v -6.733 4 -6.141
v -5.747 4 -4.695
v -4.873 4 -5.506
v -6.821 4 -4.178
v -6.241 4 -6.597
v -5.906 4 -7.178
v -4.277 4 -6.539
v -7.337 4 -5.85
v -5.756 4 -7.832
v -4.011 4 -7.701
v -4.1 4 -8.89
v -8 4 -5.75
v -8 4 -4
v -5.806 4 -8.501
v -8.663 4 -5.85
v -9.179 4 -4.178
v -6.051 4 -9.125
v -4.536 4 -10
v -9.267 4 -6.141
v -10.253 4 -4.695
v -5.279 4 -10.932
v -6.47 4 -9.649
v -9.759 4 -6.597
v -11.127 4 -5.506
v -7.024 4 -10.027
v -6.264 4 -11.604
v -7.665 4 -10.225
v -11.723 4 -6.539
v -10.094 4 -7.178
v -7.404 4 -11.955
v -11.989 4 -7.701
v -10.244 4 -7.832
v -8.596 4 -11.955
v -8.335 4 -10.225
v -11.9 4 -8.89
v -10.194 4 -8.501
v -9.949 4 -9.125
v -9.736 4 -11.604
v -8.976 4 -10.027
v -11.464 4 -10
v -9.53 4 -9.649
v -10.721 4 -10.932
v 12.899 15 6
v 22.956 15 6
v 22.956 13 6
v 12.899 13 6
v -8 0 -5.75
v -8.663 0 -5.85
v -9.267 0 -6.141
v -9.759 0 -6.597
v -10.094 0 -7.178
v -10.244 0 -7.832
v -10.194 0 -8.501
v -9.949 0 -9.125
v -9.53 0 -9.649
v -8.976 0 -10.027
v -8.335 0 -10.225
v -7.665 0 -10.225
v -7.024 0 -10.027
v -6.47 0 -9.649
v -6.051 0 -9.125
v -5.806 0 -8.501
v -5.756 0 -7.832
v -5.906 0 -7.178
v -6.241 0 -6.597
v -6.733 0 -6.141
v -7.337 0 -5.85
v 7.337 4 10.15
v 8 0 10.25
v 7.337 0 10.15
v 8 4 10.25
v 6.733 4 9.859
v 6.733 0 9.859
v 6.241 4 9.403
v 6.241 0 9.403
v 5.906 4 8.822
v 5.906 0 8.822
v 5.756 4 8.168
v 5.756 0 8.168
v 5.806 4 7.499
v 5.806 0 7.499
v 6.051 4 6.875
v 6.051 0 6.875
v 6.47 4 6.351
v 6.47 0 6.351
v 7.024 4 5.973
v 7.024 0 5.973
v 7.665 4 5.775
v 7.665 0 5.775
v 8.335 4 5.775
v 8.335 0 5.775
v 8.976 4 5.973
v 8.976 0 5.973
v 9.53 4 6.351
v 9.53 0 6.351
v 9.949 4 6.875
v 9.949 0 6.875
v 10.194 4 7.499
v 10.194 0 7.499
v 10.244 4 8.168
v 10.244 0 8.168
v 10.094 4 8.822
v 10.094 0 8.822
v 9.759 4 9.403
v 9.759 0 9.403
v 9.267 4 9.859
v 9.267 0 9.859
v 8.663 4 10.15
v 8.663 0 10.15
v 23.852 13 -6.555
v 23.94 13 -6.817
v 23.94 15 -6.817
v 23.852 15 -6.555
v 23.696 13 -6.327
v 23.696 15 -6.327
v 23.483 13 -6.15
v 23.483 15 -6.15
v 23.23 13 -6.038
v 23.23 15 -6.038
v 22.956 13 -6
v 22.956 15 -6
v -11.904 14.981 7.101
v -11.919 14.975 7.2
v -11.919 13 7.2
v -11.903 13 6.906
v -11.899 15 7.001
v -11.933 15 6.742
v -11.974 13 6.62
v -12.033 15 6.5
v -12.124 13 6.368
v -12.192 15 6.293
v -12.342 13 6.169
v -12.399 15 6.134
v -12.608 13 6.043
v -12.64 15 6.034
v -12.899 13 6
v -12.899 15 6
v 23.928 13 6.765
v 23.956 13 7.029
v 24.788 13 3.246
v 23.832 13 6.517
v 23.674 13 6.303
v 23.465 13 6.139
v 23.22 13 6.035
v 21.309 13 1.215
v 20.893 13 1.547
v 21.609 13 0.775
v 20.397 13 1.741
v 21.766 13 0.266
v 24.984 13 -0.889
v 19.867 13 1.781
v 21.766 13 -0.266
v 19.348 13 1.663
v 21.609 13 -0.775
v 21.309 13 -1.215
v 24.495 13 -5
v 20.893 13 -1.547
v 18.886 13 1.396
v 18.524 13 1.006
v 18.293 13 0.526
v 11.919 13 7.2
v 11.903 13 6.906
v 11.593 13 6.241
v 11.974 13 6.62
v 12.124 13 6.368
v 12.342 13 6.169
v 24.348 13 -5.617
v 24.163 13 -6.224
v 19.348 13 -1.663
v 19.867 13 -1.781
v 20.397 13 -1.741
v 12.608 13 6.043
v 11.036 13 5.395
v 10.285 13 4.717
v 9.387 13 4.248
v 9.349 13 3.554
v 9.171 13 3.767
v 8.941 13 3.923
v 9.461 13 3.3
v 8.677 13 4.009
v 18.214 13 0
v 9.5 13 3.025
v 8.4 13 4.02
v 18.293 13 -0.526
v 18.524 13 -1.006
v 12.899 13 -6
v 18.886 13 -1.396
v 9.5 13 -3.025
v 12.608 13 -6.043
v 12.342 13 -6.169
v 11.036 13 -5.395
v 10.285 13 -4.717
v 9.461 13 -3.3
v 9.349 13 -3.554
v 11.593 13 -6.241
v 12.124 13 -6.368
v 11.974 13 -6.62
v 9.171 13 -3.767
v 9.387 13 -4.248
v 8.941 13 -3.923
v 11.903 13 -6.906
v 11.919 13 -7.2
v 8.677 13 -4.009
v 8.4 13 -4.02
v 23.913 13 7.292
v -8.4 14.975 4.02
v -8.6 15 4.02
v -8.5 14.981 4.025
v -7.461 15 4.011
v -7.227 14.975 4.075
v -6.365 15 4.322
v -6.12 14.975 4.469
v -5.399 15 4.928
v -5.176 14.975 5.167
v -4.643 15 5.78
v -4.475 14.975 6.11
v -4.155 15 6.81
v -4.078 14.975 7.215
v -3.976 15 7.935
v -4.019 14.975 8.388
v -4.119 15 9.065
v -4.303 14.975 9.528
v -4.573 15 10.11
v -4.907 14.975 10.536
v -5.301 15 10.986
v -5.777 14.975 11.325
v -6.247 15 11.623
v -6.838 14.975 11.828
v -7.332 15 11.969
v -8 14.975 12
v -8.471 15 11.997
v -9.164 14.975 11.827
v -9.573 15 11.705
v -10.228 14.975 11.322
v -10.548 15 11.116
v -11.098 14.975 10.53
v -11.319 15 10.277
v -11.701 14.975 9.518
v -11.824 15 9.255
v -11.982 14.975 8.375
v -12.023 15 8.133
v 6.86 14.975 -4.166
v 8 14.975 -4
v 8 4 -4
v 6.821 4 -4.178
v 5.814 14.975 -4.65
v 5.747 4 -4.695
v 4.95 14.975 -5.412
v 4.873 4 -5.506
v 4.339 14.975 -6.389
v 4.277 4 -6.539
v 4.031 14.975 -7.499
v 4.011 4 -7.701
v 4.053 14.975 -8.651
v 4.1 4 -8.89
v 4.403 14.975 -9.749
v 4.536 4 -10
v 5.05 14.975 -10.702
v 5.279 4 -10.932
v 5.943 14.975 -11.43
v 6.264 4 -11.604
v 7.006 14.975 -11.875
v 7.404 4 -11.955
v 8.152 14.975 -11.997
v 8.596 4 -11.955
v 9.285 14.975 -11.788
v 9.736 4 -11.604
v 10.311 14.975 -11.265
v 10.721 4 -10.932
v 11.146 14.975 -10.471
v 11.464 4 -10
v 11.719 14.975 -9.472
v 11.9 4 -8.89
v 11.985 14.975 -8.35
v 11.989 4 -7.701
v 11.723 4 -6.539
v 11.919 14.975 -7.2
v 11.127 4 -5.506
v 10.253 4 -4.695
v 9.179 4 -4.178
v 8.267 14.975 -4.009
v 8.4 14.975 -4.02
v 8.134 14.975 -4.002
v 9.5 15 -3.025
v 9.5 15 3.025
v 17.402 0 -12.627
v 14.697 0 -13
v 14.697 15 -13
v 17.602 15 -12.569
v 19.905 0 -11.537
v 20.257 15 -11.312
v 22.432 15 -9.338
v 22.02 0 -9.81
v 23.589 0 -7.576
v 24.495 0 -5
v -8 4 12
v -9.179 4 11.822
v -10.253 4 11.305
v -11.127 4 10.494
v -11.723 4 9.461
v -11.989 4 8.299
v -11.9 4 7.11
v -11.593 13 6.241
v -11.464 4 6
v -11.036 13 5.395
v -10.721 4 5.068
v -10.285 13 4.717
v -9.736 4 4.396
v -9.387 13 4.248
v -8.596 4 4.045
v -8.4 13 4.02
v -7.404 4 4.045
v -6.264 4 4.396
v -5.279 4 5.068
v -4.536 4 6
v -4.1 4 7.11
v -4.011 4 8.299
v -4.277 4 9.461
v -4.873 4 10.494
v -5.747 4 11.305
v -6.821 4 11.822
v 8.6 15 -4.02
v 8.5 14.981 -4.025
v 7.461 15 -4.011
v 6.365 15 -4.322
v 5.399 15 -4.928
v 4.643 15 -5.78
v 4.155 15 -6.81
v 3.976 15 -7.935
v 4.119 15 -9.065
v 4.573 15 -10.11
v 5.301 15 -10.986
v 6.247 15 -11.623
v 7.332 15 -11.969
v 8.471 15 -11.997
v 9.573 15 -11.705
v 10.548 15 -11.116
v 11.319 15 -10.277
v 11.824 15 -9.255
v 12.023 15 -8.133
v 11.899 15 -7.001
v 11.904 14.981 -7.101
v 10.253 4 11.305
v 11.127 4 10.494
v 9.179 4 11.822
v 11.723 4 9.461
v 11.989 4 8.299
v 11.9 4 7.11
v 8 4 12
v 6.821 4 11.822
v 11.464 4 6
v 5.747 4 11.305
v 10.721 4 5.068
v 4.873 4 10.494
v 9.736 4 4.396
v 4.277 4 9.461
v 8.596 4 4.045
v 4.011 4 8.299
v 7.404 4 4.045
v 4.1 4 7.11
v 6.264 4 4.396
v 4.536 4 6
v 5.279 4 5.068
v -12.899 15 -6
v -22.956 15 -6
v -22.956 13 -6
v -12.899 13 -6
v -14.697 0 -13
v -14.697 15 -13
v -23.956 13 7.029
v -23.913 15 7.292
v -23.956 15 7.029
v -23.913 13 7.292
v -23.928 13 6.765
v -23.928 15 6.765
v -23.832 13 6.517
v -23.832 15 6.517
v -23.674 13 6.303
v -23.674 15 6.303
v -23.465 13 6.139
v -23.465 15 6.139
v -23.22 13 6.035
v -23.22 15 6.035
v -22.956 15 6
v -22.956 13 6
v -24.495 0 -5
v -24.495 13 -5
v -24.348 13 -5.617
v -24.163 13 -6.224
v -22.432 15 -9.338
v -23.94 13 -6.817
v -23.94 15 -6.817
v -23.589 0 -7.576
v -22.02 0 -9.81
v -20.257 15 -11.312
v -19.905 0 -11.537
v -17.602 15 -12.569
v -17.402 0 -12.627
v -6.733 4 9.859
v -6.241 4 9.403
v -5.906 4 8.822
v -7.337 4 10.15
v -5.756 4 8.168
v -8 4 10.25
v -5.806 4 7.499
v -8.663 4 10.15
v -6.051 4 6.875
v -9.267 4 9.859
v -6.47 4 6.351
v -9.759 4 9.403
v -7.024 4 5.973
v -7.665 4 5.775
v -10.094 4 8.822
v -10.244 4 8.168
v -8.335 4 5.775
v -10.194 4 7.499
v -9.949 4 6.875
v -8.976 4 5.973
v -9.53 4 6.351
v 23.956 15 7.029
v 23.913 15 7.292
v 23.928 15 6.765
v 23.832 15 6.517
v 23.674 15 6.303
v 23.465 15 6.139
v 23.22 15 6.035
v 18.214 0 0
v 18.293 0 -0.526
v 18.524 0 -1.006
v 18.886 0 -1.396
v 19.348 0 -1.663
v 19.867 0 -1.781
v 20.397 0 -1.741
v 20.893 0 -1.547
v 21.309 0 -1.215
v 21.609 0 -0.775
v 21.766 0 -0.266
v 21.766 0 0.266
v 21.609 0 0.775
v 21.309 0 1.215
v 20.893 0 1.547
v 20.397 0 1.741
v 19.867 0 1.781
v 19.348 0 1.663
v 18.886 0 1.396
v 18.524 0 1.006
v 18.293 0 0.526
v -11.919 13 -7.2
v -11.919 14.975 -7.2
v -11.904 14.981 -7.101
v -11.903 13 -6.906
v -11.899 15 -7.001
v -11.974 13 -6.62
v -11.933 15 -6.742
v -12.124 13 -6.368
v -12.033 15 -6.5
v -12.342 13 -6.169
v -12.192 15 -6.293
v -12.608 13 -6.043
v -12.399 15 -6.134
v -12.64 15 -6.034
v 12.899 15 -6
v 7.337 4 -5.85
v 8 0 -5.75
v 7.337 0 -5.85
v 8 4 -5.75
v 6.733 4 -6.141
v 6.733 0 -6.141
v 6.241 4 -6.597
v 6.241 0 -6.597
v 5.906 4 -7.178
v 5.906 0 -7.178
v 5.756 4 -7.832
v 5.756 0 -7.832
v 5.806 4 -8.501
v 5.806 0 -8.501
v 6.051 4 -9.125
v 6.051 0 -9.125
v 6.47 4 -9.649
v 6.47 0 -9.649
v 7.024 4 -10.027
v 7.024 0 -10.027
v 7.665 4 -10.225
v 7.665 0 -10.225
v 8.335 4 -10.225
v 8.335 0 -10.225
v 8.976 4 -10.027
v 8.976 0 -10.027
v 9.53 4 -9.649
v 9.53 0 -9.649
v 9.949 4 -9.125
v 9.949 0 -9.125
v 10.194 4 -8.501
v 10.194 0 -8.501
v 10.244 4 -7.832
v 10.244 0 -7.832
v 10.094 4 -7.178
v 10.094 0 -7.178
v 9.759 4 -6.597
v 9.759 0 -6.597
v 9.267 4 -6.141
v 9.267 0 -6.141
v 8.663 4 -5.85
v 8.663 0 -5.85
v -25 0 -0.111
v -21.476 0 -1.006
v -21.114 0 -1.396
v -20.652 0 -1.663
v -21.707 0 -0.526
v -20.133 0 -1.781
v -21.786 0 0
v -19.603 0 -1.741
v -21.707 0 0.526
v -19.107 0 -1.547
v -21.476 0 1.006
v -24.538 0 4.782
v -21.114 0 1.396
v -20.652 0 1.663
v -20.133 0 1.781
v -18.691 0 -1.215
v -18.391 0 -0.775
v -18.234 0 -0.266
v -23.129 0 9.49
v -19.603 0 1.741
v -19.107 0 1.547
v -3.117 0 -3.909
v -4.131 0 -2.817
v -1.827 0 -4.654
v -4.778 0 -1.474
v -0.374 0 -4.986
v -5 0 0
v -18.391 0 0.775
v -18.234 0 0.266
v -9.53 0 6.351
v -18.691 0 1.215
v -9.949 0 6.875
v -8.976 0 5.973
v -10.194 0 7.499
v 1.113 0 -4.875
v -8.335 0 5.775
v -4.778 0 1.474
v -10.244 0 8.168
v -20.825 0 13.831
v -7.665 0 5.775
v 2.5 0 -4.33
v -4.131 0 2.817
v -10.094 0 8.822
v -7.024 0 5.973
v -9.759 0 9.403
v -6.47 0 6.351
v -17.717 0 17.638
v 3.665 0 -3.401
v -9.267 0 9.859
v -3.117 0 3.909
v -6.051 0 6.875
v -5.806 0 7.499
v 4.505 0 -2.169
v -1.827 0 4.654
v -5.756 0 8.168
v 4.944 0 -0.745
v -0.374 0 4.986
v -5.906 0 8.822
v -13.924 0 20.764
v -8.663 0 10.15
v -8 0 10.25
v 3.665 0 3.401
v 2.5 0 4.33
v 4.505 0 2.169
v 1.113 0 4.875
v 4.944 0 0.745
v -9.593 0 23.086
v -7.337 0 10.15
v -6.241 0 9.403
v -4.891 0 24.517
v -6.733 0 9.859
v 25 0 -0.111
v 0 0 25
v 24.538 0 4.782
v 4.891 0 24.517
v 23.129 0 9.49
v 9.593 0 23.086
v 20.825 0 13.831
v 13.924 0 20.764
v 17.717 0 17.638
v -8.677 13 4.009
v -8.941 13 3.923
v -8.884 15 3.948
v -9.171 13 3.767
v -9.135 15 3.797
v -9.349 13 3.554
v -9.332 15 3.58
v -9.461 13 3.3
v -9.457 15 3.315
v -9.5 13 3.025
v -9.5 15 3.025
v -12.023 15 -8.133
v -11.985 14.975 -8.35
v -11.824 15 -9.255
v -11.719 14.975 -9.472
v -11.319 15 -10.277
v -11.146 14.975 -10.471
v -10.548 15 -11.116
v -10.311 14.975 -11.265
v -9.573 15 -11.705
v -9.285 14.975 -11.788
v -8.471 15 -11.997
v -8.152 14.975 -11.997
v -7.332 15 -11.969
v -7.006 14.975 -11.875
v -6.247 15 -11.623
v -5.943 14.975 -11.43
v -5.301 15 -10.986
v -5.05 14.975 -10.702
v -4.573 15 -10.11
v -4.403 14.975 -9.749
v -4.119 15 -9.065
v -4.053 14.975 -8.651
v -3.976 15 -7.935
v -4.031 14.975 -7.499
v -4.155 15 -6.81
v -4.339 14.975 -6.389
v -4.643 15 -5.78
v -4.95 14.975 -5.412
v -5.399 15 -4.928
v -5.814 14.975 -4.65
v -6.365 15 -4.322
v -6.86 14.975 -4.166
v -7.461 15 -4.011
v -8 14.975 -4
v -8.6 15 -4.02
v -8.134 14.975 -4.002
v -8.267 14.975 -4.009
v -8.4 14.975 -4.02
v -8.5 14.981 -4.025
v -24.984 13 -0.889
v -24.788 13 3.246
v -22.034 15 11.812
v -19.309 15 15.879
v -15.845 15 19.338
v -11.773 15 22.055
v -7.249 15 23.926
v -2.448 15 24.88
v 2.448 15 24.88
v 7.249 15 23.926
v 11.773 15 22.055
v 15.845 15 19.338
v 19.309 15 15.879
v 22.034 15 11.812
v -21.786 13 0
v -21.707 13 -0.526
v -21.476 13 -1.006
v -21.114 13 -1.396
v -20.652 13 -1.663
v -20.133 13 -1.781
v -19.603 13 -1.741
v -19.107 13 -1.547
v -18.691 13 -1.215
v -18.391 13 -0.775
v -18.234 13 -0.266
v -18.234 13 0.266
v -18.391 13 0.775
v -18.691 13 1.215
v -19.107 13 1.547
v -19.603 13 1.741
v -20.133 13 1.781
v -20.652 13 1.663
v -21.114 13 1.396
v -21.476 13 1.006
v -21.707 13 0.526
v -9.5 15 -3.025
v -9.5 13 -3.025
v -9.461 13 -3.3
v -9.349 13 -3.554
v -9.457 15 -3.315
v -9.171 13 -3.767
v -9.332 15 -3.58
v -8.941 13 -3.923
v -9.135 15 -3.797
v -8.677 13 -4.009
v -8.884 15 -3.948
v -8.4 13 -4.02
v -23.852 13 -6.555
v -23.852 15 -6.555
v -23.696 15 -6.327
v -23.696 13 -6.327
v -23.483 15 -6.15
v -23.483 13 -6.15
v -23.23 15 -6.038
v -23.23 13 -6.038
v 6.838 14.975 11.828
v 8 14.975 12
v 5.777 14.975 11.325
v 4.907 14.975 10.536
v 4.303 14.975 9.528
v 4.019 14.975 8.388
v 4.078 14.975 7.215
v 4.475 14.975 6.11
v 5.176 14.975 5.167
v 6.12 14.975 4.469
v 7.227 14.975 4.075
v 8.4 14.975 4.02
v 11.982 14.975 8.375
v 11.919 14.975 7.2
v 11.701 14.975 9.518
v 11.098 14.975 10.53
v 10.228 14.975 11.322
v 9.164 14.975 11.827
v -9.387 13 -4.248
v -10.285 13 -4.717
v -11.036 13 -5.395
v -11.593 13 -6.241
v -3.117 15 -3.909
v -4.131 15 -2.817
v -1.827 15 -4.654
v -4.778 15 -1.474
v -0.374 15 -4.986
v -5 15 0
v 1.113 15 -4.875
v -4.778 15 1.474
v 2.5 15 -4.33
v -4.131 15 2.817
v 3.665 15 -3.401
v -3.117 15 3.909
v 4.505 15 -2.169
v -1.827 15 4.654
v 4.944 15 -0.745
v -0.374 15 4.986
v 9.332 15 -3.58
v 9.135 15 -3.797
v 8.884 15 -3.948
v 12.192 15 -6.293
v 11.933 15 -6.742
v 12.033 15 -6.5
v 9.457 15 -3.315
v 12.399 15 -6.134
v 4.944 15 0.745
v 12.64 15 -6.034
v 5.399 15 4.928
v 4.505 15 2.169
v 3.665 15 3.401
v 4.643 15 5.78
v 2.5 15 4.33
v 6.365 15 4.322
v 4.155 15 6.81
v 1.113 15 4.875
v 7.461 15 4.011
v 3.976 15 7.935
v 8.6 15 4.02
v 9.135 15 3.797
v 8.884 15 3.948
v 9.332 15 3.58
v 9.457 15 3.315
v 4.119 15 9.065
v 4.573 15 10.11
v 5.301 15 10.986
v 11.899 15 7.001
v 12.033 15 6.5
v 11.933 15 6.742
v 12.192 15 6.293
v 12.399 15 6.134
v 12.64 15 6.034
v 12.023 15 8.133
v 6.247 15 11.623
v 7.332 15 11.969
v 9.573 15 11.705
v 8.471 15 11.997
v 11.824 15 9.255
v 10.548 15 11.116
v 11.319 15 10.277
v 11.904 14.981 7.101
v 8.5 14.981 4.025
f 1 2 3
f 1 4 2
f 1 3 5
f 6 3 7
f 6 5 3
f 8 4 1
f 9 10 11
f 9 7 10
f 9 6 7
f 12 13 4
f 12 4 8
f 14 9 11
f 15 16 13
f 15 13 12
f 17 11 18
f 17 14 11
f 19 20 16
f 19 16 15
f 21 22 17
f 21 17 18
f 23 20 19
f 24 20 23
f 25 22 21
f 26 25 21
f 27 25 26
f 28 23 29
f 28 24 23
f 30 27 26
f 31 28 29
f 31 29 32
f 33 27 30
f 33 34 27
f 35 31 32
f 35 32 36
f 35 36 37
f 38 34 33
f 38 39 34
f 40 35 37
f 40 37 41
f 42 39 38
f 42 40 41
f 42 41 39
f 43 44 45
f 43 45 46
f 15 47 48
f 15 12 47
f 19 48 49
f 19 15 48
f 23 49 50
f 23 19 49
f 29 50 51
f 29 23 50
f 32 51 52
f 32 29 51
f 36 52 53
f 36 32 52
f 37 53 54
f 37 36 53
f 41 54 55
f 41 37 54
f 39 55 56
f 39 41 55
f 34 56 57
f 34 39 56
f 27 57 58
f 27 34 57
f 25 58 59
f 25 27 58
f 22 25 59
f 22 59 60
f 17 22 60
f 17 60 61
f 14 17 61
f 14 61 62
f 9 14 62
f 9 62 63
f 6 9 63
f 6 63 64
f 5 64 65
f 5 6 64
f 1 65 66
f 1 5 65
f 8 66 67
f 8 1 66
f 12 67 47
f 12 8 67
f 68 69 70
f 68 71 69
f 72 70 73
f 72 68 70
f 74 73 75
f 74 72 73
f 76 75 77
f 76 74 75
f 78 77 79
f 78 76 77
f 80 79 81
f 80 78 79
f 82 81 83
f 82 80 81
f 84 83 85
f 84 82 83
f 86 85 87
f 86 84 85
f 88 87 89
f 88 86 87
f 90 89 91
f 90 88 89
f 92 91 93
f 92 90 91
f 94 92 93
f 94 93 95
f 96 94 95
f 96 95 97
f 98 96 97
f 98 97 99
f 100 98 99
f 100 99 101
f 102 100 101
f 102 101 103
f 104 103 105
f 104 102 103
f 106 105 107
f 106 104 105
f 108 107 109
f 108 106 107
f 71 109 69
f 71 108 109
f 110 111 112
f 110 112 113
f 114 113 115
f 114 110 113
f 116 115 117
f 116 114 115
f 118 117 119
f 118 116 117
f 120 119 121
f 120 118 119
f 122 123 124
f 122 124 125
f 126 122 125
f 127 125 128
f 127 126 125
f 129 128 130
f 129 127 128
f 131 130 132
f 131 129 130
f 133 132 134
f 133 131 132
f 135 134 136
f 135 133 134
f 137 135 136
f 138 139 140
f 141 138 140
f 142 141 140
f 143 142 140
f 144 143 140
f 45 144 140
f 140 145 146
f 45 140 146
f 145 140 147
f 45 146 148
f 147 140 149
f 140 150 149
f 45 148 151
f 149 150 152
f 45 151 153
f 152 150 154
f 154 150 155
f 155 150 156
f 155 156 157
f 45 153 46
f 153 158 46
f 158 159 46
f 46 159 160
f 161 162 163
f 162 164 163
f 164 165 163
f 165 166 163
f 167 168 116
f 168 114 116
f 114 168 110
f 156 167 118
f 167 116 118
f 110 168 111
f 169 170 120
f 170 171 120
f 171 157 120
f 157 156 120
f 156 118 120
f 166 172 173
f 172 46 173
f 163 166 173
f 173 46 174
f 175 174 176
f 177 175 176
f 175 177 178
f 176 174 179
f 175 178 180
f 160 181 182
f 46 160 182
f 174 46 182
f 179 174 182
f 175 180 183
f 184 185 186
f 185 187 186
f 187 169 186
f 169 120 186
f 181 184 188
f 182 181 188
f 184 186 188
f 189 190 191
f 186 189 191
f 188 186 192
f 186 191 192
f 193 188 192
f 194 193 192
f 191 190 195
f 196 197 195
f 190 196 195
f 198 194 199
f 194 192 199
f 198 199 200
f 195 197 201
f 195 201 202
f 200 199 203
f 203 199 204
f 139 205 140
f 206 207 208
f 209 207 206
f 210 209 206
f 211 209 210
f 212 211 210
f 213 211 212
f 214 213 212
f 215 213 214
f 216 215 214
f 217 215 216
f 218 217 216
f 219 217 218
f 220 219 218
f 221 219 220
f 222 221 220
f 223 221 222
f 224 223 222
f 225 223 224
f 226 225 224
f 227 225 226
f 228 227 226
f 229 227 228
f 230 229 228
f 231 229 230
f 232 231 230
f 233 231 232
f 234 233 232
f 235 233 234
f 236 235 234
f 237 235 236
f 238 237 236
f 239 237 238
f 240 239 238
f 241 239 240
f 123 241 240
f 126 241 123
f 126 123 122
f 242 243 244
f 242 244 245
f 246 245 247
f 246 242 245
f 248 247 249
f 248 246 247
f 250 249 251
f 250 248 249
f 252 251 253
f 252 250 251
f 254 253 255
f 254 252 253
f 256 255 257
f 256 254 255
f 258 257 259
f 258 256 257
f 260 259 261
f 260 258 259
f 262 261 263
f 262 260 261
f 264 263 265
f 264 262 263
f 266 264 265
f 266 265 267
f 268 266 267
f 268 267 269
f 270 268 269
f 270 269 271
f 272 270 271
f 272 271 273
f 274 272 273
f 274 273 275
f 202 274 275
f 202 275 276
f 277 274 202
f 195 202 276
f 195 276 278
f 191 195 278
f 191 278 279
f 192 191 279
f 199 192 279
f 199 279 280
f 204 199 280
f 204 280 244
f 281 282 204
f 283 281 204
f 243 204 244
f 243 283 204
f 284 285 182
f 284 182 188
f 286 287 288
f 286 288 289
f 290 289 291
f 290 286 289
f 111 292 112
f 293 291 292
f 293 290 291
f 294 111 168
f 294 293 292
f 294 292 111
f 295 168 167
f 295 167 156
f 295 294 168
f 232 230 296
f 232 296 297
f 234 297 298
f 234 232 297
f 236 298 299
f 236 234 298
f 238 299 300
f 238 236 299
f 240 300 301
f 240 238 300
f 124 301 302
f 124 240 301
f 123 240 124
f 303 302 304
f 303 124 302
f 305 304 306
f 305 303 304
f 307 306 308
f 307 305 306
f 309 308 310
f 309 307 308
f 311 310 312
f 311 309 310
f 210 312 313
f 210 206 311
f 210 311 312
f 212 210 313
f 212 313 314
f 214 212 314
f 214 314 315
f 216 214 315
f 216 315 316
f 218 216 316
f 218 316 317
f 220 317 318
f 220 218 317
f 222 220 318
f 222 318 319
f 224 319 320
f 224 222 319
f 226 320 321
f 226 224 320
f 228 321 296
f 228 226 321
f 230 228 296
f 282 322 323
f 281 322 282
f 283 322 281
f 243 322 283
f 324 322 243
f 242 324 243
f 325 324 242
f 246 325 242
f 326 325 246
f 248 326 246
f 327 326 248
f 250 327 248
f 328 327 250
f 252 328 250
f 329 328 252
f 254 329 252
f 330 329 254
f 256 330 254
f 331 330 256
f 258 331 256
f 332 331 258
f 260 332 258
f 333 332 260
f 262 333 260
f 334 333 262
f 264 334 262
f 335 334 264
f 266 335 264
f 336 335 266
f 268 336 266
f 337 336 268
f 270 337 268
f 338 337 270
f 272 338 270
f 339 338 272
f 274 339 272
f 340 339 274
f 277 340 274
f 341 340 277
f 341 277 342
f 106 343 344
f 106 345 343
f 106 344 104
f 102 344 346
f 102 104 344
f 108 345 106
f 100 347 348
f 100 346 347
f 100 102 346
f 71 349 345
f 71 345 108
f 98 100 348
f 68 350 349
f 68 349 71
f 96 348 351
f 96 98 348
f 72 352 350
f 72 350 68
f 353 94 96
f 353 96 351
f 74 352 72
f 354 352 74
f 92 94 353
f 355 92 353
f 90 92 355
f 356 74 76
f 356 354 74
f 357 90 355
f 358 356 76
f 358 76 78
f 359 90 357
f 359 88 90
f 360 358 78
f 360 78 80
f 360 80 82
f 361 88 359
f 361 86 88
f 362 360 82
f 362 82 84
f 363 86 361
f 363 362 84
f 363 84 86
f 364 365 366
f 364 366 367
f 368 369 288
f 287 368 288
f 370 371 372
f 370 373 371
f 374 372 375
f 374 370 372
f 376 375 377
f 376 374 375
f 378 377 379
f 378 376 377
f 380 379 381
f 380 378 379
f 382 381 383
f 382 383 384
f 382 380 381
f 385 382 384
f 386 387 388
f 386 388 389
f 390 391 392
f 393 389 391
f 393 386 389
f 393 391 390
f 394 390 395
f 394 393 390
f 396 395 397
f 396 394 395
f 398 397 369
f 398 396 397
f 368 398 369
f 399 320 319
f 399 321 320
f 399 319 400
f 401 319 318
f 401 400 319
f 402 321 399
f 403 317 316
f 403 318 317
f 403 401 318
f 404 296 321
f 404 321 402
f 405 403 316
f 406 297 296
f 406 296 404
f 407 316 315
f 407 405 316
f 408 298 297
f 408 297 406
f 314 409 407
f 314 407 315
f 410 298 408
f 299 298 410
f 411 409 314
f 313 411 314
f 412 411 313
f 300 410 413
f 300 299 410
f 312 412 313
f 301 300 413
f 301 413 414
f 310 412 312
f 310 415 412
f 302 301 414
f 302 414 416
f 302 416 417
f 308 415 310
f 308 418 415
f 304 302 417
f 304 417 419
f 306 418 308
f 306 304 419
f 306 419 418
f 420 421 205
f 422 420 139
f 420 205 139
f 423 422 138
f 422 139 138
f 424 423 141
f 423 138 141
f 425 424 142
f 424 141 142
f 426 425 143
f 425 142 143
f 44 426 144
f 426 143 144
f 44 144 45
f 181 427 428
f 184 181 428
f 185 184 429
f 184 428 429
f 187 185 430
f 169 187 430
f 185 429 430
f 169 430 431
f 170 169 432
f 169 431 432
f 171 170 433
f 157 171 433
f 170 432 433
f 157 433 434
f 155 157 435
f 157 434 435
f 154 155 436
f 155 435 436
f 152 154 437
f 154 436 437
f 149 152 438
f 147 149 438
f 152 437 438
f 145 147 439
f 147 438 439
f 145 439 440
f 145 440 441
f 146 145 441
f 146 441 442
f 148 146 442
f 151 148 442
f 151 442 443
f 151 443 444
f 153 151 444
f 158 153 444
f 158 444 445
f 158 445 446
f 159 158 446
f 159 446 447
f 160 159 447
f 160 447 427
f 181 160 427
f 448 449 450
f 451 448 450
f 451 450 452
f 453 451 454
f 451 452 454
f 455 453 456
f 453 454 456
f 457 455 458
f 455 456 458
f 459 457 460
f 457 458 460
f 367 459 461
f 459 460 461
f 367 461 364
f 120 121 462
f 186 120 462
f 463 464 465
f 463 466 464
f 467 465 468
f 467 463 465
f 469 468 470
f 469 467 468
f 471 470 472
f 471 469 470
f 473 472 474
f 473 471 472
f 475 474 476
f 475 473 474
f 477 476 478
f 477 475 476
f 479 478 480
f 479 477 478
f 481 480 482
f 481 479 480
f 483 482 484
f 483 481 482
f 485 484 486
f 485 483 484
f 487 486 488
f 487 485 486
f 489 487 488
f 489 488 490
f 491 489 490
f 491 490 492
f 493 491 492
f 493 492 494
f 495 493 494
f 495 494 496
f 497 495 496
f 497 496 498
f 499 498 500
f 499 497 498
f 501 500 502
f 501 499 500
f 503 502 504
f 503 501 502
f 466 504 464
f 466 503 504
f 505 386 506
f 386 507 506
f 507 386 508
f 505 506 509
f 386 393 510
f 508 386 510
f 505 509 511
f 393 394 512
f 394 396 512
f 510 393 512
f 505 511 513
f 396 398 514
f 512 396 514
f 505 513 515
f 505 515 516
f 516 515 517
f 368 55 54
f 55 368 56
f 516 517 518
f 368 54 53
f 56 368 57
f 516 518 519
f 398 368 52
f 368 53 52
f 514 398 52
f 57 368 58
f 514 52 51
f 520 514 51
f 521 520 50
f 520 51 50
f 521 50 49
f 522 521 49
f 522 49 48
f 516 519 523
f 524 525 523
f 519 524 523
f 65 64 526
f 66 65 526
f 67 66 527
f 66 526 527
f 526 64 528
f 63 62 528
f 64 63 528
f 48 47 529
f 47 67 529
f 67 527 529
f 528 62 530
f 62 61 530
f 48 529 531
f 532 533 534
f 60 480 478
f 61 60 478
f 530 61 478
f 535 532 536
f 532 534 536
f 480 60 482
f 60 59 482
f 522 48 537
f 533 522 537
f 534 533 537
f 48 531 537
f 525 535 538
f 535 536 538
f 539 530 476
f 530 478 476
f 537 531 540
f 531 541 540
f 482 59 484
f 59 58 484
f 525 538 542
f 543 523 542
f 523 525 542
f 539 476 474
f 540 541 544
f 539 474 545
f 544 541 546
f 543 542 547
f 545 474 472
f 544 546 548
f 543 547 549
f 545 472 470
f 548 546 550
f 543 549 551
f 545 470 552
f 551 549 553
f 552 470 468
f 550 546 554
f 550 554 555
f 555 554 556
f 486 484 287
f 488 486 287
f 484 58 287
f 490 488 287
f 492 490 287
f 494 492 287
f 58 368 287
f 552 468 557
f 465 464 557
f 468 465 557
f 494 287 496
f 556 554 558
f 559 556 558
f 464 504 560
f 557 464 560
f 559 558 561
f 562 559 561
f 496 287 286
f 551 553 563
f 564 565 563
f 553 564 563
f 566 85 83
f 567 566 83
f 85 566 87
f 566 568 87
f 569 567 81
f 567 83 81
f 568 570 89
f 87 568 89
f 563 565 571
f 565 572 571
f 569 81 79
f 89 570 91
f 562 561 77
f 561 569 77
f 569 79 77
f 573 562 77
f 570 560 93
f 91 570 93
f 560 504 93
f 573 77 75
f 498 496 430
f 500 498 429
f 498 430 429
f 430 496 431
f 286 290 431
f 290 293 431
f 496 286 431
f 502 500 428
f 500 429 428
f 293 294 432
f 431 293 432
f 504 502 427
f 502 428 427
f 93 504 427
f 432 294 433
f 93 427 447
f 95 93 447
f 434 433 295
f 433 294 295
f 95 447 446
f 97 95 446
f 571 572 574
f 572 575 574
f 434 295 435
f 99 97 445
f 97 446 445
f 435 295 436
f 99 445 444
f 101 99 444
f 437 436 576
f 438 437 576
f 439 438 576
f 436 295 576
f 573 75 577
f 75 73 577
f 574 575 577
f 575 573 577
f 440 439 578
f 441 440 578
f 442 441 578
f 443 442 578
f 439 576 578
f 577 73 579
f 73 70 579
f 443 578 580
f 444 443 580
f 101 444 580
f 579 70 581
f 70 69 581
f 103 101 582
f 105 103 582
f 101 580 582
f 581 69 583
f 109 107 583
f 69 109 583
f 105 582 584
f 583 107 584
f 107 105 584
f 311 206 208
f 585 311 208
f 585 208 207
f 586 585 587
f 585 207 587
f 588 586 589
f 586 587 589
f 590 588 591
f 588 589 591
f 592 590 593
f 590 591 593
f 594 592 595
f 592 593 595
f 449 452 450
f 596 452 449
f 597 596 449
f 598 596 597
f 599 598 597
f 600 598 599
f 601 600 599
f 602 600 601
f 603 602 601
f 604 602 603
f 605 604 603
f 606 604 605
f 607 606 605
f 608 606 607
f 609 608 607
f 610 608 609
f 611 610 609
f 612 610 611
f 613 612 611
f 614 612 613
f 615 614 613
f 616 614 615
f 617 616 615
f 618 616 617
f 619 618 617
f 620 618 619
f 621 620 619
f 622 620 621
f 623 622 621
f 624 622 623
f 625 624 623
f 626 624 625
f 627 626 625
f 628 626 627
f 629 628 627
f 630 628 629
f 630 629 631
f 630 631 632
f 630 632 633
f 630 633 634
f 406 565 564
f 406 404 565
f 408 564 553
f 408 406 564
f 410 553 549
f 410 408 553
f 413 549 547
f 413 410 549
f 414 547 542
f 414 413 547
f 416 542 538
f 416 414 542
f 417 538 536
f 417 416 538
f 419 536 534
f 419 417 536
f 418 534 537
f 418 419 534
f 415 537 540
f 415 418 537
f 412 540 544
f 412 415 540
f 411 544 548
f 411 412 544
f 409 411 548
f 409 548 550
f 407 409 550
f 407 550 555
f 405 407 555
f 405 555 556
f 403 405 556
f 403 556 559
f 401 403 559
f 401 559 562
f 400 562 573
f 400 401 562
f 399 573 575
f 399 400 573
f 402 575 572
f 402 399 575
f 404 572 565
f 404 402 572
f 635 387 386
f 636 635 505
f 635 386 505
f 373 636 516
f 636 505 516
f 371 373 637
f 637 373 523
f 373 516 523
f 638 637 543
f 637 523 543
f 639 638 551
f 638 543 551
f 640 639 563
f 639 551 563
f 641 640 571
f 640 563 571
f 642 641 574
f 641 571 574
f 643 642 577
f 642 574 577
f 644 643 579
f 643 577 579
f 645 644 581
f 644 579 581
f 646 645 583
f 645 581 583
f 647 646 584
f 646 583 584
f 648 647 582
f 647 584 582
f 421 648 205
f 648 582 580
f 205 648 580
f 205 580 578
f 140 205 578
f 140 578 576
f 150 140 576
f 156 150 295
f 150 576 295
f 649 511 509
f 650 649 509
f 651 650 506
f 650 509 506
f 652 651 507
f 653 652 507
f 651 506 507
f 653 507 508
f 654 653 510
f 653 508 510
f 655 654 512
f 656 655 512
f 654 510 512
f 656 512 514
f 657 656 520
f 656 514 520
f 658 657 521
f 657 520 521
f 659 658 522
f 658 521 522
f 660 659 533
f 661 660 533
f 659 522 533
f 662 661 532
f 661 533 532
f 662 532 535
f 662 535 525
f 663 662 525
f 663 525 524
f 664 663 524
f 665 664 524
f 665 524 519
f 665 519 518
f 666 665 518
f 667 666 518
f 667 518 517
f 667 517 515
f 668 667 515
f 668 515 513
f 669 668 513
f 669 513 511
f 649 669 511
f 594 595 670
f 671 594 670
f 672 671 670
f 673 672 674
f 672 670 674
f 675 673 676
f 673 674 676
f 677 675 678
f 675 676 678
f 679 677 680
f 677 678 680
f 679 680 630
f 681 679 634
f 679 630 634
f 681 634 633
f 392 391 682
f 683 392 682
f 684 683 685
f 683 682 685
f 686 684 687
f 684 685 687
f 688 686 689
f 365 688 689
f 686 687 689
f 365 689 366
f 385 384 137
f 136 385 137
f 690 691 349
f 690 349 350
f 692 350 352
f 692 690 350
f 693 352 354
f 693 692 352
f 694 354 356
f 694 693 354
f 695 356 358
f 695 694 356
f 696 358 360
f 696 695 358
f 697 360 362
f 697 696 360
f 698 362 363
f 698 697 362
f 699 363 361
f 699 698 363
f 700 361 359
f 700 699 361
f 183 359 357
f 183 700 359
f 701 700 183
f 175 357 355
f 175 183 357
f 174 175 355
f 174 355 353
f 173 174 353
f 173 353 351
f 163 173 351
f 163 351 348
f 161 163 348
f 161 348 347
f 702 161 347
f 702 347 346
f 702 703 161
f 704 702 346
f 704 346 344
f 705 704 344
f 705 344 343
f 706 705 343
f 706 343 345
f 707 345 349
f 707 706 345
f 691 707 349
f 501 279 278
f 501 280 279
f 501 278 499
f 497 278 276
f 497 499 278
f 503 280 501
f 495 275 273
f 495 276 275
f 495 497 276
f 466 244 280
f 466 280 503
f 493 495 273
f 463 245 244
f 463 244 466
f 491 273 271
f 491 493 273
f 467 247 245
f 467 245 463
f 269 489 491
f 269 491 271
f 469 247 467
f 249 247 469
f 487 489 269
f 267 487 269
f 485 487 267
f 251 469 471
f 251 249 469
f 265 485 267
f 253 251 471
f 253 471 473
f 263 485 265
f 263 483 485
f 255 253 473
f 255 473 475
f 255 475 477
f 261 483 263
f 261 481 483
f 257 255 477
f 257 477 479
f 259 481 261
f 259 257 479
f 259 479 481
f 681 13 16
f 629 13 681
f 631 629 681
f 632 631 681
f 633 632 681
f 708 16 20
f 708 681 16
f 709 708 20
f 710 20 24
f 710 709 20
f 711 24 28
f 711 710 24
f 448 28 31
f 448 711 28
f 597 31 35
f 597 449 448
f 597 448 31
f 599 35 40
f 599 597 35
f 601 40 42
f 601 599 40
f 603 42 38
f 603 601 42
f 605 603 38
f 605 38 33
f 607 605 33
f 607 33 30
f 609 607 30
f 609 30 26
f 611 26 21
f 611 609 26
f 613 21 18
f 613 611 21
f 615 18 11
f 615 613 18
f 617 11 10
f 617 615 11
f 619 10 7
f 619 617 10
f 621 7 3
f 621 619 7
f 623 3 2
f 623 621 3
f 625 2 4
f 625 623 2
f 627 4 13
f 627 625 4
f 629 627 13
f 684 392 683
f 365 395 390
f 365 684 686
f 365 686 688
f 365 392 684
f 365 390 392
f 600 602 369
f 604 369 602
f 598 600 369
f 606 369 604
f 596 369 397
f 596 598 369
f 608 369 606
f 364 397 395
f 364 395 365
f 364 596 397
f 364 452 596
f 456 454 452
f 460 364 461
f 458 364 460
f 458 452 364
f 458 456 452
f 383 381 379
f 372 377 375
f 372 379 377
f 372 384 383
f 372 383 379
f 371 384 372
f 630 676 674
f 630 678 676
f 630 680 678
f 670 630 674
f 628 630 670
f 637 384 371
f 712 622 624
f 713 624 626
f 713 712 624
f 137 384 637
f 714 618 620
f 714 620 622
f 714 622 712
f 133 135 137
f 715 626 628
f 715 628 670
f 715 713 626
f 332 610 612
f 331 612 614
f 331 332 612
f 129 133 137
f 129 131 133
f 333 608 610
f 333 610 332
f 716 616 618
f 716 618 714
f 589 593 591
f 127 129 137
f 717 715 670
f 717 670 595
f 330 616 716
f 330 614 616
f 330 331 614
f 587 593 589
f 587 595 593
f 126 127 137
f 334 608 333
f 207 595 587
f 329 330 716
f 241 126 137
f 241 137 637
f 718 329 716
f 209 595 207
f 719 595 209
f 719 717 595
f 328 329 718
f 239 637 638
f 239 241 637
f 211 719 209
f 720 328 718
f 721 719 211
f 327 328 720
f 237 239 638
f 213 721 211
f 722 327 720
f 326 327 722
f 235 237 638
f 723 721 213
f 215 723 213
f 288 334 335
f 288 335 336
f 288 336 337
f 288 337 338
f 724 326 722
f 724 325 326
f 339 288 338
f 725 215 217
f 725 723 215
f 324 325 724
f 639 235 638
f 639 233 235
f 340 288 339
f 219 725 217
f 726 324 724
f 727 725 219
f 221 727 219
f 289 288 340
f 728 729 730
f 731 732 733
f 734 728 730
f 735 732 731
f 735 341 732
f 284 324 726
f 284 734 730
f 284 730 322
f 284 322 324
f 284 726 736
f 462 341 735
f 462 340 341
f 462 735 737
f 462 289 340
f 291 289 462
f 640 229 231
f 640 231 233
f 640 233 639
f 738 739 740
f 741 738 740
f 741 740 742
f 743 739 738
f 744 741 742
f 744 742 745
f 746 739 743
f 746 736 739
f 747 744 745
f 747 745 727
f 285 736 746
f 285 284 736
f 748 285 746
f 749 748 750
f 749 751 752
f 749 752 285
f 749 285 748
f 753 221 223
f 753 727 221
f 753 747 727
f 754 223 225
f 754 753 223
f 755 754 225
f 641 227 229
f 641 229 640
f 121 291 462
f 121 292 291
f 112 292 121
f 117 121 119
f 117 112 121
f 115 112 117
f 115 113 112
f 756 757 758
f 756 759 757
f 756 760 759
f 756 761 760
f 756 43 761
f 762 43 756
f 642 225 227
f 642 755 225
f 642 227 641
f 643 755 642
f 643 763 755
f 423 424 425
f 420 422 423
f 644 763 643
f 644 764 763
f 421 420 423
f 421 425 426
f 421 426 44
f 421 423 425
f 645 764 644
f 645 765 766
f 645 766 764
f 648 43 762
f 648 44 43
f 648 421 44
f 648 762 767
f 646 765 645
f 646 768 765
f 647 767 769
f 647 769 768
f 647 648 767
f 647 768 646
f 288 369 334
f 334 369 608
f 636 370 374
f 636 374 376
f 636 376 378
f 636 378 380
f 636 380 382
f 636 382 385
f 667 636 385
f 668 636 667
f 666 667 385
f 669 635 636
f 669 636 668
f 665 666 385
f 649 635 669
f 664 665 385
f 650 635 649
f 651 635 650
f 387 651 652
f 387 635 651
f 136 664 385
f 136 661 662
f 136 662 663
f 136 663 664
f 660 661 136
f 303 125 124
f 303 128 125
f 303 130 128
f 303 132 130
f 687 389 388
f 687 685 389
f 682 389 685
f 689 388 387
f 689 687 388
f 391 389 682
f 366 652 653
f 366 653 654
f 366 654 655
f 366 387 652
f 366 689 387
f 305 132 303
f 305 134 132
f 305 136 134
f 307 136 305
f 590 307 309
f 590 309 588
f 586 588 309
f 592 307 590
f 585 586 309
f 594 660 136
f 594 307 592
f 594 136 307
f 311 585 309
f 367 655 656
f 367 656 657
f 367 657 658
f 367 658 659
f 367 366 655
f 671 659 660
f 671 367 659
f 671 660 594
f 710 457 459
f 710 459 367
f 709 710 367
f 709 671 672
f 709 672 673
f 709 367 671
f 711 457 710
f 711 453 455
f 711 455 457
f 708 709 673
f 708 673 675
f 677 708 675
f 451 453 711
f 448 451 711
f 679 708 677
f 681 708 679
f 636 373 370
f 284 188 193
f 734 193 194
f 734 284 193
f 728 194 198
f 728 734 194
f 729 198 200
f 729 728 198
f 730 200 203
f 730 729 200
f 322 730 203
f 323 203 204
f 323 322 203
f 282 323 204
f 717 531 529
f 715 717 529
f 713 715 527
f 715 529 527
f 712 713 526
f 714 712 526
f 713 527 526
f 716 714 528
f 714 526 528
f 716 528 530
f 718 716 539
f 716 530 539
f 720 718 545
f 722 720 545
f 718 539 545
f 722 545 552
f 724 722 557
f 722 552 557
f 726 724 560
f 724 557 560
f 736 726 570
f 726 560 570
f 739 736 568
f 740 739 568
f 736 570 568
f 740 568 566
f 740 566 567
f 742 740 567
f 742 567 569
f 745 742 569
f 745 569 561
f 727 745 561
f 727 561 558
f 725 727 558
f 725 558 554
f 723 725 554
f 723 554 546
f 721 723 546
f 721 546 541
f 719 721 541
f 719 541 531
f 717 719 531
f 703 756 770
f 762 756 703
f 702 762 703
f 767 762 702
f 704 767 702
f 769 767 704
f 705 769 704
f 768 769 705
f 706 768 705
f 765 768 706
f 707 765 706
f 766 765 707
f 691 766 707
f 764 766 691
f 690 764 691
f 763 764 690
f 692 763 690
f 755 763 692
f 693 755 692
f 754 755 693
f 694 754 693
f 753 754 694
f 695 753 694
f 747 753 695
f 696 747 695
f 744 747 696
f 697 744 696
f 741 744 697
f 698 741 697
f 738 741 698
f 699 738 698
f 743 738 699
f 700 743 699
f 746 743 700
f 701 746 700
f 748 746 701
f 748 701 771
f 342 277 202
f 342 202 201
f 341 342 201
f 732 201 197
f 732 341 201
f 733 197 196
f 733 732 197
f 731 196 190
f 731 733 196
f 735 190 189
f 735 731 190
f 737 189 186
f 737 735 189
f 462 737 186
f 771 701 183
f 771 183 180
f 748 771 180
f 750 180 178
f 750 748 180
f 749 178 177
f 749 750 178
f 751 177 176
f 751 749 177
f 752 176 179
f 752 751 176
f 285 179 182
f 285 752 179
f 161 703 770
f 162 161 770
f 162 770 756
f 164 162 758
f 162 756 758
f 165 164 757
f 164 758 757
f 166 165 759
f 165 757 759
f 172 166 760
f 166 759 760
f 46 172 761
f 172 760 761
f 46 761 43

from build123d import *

# Parameters (mm, degrees)
SKETCH1_R                       = 25
BOSS_EXTRUDE1_DEPTH             = 15
CBORE_FOR_M4_SHCS1_AT_2_COUNT   = 2
CBORE_FOR_M4_SHCS1_AT_2_PITCH   = 16
CBORE_FOR_M4_SHCS1_AT_3_COUNT   = 2
CBORE_FOR_M4_SHCS1_AT_3_PITCH   = 22.627416998
CBORE_FOR_M4_SHCS1_AT_4_COUNT   = 2
CBORE_FOR_M4_SHCS1_AT_4_PITCH   = 16
F_10_0MM_DOWEL_HOLE1_D          = 10
F_9_64_0_14063_DIAMETER_HOLE1_D = 3.572002
SKETCH9_W                       = 18
SKETCH9_H                       = 12
CUT_EXTRUDE1_DEPTH              = 2
FILLET2_R                       = 1
CUT_EXTRUDE2_DEPTH              = 39.405728739
FILLET3_START                   = -1
FILLET3_DEPTH                   = 17


with BuildPart() as part:
    # Sketch1 → Boss-Extrude1 (new body)
    with BuildSketch(Plane(origin=(0, 0, 0), x_dir=(1, 0, 0), z_dir=(0, 1, 0))):
        with Locations(Location((0, 0, 0), (0, 0, 270))):
            Circle(SKETCH1_R)
    extrude(amount=BOSS_EXTRUDE1_DEPTH)

    # Sketch4 → CBORE for M4 SHCS1 (revolve, cut)
    with BuildSketch(Plane(origin=(-8, 15, -8), x_dir=(0, 0, 1), z_dir=(1, 0, 0))):
        Polygon((0, 0), (0, 15), (2.25, 15), (2.25, 11), (4, 11), (4, 0.025), (4.025, 0), align=None)
    cbore_for_m4_shcs1 = revolve(axis=Axis((-8, 21.35, -8), (0, -1, 0)), mode=Mode.SUBTRACT)

    # CBORE for M4 SHCS1 at 2: CBORE for M4 SHCS1 ×2
    with Locations(*[(i * CBORE_FOR_M4_SHCS1_AT_2_PITCH, 0, 0) for i in range(1, CBORE_FOR_M4_SHCS1_AT_2_COUNT)]):
        add(cbore_for_m4_shcs1, mode=Mode.SUBTRACT)

    # CBORE for M4 SHCS1 at 3: CBORE for M4 SHCS1 ×2
    with Locations(*[Vector(0.7071067811865476, 0, 0.7071067811865476) * (i * CBORE_FOR_M4_SHCS1_AT_3_PITCH) for i in range(1, CBORE_FOR_M4_SHCS1_AT_3_COUNT)]):
        add(cbore_for_m4_shcs1, mode=Mode.SUBTRACT)

    # CBORE for M4 SHCS1 at 4: CBORE for M4 SHCS1 ×2
    with Locations(*[(0, 0, i * CBORE_FOR_M4_SHCS1_AT_4_PITCH) for i in range(1, CBORE_FOR_M4_SHCS1_AT_4_COUNT)]):
        add(cbore_for_m4_shcs1, mode=Mode.SUBTRACT)

    # Ø10.0mm Dowel Hole1 (through all)
    with Locations(Plane(origin=(0, 15, 0), x_dir=(1, 0, 0), z_dir=(0, 1, 0))):
        with Locations((0, 0)):
            Hole(F_10_0MM_DOWEL_HOLE1_D / 2)

    # 9/64 (0.14063) Diameter Hole1 (through all)
    with Locations(Plane(origin=(0, 15, 0), x_dir=(1, 0, 0), z_dir=(0, 1, 0))):
        with Locations((-20, 0), (20, 0)):
            Hole(F_9_64_0_14063_DIAMETER_HOLE1_D / 2)

    # Sketch9 → Cut-Extrude1 (cut)
    with BuildSketch(Plane(origin=(0, 15, 0), x_dir=(1, 0, 0), z_dir=(0, 1, 0))):
        with Locations((-18.5, 0)):
            Rectangle(SKETCH9_W, SKETCH9_H)
    cut_extrude1 = extrude(amount=-CUT_EXTRUDE1_DEPTH, mode=Mode.SUBTRACT)

    # Mirror1: Cut-Extrude1 across plane
    add(cut_extrude1.mirror(Plane(origin=(0, 0, 0), x_dir=(0, 0, 1), z_dir=(1, 0, 0))), mode=Mode.SUBTRACT)

    # Fillet2
    fillet2_edges = [part.edges().sort_by_distance(p)[0] for p in [
        (-24.269322199, 14, -6),
        (-24.269322199, 14, 6),
        (-11.464101615, 13.9875, 6),
        (-9.5, 13.9875, 4.291900756),
        (-11.464101615, 13.9875, -6),
        (-9.5, 13.9875, -4.291900756),
        (24.269322199, 14, 6),
        (9.5, 13.9875, 4.291900756),
        (9.5, 13.9875, -4.291900756),
        (24.269322199, 14, -6),
        (11.464101615, 13.9875, -6),
        (11.464101615, 13.9875, 6),
    ]]
    fillet(fillet2_edges, radius=FILLET2_R)

    # Sketch10 → Cut-Extrude2 (cut, through all)
    with BuildSketch(Plane(origin=(0, 15, 0), x_dir=(1, 0, 0), z_dir=(0, 1, 0))):
        with BuildLine():
            ThreePointArc((21.354156504, 13), (0, 25), (-21.354156504, 13))
            Line((-21.354156504, 13), (21.354156504, 13))
        make_face()
    extrude(amount=-CUT_EXTRUDE2_DEPTH, mode=Mode.SUBTRACT)

    # Fillet3: read off the stored shape, not the designer's step
    # Fillet3 outline → Fillet3 (cut)
    with BuildSketch(Plane(origin=(0, 0, 0), x_dir=(1, 0, 0), z_dir=(0, 1, 0)).offset(FILLET3_START)):
        with BuildLine():
            Line((21.354156504, 13), (14.696938457, 13))
            ThreePointArc((14.696938457, 13), (21.021493777, 10.745966692), (24.494897428, 5))
            ThreePointArc((24.494897428, 5), (23.270881733, 9.135976324), (21.354156504, 13))
        make_face()
        with BuildLine():
            Line((-14.696938457, 13), (-21.354156504, 13))
            ThreePointArc((-21.354156504, 13), (-23.270881733, 9.135976324), (-24.494897428, 5))
            ThreePointArc((-24.494897428, 5), (-21.021493777, 10.745966692), (-14.696938457, 13))
        make_face()
    extrude(amount=FILLET3_DEPTH, mode=Mode.SUBTRACT)


solid = part.part
